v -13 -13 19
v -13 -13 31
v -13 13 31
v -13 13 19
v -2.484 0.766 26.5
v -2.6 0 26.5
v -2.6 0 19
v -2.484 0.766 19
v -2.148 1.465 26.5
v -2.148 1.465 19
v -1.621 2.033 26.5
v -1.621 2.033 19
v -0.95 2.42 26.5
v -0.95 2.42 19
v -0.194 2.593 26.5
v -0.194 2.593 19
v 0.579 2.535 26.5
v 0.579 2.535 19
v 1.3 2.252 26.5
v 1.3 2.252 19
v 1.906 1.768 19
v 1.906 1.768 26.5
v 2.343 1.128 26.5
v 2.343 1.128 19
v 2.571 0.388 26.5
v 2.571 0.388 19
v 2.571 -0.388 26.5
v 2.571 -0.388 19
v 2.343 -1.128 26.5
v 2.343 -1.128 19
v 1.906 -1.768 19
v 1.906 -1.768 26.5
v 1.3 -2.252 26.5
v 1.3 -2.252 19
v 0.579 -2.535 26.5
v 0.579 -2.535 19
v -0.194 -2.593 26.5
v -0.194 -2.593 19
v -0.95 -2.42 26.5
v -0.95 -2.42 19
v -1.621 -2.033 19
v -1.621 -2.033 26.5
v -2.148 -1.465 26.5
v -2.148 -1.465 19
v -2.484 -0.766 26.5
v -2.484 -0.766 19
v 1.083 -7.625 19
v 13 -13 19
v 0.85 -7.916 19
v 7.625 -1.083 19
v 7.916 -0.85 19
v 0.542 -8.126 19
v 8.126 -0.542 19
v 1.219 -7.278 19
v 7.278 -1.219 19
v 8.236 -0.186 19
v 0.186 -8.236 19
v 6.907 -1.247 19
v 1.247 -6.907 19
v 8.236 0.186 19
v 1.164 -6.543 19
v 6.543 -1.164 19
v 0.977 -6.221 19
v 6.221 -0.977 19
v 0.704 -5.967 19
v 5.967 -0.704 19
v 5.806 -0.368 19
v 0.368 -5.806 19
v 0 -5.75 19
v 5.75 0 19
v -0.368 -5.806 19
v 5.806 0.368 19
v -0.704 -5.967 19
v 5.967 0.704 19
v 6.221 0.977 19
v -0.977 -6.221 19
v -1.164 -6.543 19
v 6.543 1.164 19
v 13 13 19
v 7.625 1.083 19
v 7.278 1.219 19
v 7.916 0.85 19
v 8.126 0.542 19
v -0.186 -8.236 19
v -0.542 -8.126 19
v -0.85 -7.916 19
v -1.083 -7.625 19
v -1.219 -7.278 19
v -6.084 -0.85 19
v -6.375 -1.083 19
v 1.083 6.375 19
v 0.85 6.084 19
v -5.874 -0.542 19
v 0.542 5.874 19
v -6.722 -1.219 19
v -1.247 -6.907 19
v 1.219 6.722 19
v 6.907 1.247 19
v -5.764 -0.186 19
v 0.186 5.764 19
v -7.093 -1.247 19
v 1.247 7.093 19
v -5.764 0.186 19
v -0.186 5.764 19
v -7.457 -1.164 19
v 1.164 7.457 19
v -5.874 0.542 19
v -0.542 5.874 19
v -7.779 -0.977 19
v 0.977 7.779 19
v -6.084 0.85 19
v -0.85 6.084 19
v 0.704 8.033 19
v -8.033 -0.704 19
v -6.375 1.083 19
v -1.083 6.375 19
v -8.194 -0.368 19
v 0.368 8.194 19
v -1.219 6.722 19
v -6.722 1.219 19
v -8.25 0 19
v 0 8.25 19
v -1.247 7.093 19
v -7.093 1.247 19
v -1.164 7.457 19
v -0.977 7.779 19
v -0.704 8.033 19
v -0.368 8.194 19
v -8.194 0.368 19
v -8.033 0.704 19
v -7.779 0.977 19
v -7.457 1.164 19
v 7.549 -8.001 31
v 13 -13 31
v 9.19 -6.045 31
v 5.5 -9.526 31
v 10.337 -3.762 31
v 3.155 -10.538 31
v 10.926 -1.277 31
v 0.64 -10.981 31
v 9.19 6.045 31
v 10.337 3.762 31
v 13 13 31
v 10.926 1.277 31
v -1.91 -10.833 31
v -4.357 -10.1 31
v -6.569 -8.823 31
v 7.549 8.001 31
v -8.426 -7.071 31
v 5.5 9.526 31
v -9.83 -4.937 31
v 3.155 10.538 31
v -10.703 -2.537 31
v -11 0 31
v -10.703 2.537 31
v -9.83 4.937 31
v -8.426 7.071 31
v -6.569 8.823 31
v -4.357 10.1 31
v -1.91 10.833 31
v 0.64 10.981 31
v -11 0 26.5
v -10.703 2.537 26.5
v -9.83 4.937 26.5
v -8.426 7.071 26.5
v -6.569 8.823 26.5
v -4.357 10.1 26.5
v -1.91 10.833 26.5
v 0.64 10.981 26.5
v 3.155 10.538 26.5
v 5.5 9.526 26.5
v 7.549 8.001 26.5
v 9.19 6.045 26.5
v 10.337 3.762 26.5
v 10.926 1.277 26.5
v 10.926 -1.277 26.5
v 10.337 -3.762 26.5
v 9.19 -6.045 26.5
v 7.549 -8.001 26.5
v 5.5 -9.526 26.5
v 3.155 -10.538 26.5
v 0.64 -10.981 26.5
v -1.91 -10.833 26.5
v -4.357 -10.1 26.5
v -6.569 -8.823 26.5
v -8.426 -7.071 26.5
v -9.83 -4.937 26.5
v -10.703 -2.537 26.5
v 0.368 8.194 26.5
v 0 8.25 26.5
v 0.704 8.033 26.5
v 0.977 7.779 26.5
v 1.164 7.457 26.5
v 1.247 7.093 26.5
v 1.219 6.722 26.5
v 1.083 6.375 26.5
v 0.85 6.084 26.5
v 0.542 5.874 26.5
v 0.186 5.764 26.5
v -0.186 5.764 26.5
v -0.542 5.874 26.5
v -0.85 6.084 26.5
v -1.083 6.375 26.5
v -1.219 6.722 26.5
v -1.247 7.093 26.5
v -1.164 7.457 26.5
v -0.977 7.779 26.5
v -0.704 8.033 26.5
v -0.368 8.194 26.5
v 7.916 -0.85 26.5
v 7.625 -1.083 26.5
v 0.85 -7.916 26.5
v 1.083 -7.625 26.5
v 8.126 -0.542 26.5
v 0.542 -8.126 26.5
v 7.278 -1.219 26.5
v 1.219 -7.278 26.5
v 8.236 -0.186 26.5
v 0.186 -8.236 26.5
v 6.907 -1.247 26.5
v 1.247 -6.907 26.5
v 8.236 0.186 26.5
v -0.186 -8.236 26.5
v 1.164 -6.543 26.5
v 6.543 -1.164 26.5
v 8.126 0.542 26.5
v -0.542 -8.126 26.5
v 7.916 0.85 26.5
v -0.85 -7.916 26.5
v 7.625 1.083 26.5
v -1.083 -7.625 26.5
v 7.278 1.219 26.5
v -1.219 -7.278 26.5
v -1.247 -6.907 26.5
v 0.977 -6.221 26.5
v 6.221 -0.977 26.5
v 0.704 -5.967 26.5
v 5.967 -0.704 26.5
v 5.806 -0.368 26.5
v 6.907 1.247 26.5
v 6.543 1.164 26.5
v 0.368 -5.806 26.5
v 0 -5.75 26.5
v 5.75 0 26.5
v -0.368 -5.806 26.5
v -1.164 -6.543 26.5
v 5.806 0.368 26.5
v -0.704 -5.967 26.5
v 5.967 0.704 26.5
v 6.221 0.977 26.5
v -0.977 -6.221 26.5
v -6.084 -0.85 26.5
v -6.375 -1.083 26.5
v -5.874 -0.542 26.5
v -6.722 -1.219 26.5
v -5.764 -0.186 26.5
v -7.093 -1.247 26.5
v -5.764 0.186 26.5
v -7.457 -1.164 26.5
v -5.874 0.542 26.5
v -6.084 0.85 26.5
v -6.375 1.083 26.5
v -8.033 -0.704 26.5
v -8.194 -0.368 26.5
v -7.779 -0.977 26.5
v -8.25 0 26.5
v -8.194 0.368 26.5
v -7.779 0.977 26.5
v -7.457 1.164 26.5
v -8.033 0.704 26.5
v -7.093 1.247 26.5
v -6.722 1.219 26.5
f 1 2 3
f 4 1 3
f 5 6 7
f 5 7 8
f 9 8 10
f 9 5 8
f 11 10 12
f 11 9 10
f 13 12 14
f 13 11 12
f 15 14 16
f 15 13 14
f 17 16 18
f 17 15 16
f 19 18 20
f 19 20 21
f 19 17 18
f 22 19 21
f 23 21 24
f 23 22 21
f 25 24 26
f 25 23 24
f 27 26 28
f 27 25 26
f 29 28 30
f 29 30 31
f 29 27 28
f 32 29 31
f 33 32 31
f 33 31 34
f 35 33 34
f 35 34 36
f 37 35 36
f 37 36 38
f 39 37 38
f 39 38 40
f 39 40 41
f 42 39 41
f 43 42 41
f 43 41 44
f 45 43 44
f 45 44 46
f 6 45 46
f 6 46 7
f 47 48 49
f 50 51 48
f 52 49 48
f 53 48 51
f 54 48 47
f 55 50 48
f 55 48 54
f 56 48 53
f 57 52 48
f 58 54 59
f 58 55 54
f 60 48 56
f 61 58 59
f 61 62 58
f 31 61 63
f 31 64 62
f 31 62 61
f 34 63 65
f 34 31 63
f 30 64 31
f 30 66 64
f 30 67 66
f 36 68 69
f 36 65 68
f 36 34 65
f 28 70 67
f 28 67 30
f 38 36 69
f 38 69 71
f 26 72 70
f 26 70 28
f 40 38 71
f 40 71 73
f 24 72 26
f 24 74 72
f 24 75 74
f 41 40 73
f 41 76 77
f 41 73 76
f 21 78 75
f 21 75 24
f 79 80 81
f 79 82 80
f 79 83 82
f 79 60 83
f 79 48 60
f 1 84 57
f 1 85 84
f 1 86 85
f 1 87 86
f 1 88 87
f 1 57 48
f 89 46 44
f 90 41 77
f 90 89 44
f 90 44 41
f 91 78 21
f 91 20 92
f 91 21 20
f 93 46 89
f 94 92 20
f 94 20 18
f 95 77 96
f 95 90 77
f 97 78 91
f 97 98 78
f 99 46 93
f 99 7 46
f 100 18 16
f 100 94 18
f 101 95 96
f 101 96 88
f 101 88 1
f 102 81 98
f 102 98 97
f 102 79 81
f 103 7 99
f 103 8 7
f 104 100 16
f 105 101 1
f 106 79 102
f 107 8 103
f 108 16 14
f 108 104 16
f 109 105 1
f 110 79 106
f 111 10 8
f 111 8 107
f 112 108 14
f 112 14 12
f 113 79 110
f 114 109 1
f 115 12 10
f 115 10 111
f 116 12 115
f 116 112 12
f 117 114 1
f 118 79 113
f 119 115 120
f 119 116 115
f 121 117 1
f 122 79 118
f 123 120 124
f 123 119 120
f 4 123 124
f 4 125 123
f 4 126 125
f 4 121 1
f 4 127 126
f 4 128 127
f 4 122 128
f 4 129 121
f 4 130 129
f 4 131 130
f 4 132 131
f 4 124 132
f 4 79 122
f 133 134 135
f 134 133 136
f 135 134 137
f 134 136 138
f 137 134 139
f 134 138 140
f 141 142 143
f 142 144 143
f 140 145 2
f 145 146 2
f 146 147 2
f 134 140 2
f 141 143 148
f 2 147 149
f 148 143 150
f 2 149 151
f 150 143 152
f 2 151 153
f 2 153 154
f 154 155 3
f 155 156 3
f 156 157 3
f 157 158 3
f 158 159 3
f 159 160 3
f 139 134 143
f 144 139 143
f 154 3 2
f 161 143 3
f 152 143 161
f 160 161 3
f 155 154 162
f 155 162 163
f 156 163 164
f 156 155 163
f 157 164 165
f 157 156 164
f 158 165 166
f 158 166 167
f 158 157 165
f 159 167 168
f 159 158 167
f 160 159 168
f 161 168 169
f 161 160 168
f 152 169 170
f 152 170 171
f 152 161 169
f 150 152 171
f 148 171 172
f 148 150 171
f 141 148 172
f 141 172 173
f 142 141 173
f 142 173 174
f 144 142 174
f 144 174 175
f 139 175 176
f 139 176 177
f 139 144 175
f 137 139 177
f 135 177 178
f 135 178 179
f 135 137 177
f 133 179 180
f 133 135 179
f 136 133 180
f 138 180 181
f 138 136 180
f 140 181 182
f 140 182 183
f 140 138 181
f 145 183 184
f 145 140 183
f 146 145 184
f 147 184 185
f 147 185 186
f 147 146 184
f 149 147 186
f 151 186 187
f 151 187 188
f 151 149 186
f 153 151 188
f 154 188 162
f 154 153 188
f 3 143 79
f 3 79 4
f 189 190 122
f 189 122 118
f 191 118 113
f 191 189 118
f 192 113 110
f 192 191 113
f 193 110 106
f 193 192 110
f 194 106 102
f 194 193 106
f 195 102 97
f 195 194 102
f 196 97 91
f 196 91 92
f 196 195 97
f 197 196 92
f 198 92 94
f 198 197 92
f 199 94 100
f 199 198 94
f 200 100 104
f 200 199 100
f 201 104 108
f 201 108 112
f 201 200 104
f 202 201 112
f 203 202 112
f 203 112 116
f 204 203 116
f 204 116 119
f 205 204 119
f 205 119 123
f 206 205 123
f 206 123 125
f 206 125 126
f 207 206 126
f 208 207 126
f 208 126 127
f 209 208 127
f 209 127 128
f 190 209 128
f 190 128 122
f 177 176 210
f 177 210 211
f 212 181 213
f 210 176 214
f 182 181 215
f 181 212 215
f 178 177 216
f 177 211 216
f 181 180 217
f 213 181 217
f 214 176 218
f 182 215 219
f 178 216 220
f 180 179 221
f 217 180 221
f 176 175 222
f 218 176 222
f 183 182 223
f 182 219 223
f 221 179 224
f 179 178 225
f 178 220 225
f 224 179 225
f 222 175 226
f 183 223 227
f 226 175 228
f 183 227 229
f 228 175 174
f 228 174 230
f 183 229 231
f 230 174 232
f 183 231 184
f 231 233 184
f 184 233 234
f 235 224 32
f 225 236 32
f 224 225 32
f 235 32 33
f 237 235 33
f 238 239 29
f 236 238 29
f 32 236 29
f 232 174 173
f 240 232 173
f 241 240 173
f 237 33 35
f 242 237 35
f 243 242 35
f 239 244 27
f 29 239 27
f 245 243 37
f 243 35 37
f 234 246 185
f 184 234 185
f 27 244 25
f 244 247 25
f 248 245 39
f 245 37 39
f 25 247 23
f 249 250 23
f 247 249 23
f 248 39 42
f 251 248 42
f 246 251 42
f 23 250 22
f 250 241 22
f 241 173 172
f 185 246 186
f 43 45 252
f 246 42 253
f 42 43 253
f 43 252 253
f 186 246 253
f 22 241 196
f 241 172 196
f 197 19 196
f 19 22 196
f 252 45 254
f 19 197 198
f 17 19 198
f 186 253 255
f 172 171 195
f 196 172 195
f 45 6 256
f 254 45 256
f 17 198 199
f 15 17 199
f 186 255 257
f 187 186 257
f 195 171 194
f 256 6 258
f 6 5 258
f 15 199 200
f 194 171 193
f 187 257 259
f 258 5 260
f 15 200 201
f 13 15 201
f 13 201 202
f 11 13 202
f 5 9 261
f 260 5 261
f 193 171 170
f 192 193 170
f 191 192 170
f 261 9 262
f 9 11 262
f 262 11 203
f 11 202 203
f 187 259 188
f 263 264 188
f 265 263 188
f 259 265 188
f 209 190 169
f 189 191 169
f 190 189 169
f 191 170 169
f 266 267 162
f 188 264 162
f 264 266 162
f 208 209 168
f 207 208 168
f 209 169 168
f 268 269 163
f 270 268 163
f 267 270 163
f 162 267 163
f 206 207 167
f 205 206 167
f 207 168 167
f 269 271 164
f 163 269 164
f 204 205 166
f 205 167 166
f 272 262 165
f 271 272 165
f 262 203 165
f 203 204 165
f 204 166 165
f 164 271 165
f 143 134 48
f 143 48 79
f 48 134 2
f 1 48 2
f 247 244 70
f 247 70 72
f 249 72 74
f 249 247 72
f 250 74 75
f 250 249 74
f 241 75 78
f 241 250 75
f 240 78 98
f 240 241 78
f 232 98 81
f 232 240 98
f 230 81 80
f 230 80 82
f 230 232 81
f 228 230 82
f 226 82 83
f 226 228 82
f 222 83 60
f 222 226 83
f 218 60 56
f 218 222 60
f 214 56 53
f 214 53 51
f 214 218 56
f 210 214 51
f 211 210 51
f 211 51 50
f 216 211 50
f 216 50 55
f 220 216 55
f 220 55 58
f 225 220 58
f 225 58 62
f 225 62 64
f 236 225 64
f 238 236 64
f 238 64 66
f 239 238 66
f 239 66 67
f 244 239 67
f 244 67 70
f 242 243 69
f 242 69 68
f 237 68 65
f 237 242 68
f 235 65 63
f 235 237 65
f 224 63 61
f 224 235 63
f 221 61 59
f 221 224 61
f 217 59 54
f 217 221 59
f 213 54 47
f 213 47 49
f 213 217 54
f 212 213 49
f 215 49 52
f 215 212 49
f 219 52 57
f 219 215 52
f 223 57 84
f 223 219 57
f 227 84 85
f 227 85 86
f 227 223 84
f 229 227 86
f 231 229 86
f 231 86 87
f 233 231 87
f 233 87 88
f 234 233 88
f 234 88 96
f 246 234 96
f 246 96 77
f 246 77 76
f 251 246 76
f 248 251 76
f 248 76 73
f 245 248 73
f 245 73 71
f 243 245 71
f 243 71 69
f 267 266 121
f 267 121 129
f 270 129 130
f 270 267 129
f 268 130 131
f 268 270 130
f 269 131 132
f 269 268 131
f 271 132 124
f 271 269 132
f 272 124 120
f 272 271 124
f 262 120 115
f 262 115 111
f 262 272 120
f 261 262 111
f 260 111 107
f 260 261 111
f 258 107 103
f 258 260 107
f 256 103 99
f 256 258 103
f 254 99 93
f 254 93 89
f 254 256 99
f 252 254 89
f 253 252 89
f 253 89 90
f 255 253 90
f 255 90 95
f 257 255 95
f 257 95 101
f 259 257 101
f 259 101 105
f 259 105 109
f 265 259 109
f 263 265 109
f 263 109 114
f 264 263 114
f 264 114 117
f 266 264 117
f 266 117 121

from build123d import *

# Parameters (mm, degrees)
CYLINDER077_R             = 1.25
CYLINDER077_DEPTH         = 15
CYLINDER078_R             = 1.25
CYLINDER078_DEPTH         = 15
CYLINDER081_R             = 1.25
CYLINDER081_DEPTH         = 15
CYLINDER082_R             = 1.25
CYLINDER082_DEPTH         = 15
FUSION041_PLACEMENT_ANGLE = 90
CYLINDER079_R             = 11
CYLINDER079_DEPTH         = 4.5
CYLINDER080_R             = 2.6
CYLINDER080_DEPTH         = 12
BOX006_W                  = 26
BOX006_H                  = 26
BOX006_DEPTH              = 12
CUT014015_PLACEMENT_ANGLE = 180


with BuildPart() as cylinder077:
    # Cylinder077 → Cylinder077 (new body)
    with BuildSketch(Plane(origin=(7, 0, 0), x_dir=(1, 0, 0), z_dir=(0, 0, 1))):
        Circle(CYLINDER077_R)
    extrude(amount=CYLINDER077_DEPTH)


with BuildPart() as fusion042:
    # Cylinder078 → Cylinder078 (new body)
    with BuildSketch(Plane(origin=(-7, 0, 0), x_dir=(1, 0, 0), z_dir=(0, 0, 1))):
        Circle(CYLINDER078_R)
    extrude(amount=CYLINDER078_DEPTH)

    # Fusion042: union Cylinder077
    add(cylinder077.part)


with BuildPart() as cylinder081:
    # Cylinder081 → Cylinder081 (new body)
    with BuildSketch(Plane(origin=(7, 0, 0), x_dir=(1, 0, 0), z_dir=(0, 0, 1))):
        Circle(CYLINDER081_R)
    extrude(amount=CYLINDER081_DEPTH)


with BuildPart() as fusion043:
    # Cylinder082 → Cylinder082 (new body)
    with BuildSketch(Plane(origin=(-7, 0, 0), x_dir=(1, 0, 0), z_dir=(0, 0, 1))):
        Circle(CYLINDER082_R)
    extrude(amount=CYLINDER082_DEPTH)

    # Fusion041: union Cylinder081
    add(cylinder081.part)


with BuildPart() as fusion043_1:
    # Fusion041 placement: moved
    add(fusion043.part.rotate(Axis((0, 0, 0), (0, 0, 1)), FUSION041_PLACEMENT_ANGLE))

    # Fusion043: union Fusion042
    add(fusion042.part)


with BuildPart() as fusion043_2:
    # Fusion043 placement: moved
    add(fusion043_1.part.moved(Location((0, 0, -3))))


with BuildPart() as cylinder079:
    # Cylinder079 → Cylinder079 (new body)
    with BuildSketch(Plane.XY):
        Circle(CYLINDER079_R)
    extrude(amount=CYLINDER079_DEPTH)


with BuildPart() as fusion040:
    # Cylinder080 → Cylinder080 (new body)
    with BuildSketch(Plane.XY):
        Circle(CYLINDER080_R)
    extrude(amount=CYLINDER080_DEPTH)

    # Fusion040: union Cylinder079
    add(cylinder079.part)


with BuildPart() as diff_lock_holes:
    # Box006 → Box006 (new body)
    with BuildSketch(Plane(origin=(-13, -13, 0), x_dir=(1, 0, 0), z_dir=(0, 0, 1))):
        with Locations((13, 13)):
            Rectangle(BOX006_W, BOX006_H)
    extrude(amount=BOX006_DEPTH)

    # Cut014014: cut Fusion040
    add(fusion040.part, mode=Mode.SUBTRACT)

    # Cut014015: cut Fusion043
    add(fusion043_2.part, mode=Mode.SUBTRACT)


with BuildPart() as diff_lock_holes_1:
    # Cut014015 placement: moved
    add(diff_lock_holes.part.moved(Location((0, 0, 31))).rotate(Axis((0, 0, 31), (0, 1, 0)), CUT014015_PLACEMENT_ANGLE))


solid = diff_lock_holes_1.part
